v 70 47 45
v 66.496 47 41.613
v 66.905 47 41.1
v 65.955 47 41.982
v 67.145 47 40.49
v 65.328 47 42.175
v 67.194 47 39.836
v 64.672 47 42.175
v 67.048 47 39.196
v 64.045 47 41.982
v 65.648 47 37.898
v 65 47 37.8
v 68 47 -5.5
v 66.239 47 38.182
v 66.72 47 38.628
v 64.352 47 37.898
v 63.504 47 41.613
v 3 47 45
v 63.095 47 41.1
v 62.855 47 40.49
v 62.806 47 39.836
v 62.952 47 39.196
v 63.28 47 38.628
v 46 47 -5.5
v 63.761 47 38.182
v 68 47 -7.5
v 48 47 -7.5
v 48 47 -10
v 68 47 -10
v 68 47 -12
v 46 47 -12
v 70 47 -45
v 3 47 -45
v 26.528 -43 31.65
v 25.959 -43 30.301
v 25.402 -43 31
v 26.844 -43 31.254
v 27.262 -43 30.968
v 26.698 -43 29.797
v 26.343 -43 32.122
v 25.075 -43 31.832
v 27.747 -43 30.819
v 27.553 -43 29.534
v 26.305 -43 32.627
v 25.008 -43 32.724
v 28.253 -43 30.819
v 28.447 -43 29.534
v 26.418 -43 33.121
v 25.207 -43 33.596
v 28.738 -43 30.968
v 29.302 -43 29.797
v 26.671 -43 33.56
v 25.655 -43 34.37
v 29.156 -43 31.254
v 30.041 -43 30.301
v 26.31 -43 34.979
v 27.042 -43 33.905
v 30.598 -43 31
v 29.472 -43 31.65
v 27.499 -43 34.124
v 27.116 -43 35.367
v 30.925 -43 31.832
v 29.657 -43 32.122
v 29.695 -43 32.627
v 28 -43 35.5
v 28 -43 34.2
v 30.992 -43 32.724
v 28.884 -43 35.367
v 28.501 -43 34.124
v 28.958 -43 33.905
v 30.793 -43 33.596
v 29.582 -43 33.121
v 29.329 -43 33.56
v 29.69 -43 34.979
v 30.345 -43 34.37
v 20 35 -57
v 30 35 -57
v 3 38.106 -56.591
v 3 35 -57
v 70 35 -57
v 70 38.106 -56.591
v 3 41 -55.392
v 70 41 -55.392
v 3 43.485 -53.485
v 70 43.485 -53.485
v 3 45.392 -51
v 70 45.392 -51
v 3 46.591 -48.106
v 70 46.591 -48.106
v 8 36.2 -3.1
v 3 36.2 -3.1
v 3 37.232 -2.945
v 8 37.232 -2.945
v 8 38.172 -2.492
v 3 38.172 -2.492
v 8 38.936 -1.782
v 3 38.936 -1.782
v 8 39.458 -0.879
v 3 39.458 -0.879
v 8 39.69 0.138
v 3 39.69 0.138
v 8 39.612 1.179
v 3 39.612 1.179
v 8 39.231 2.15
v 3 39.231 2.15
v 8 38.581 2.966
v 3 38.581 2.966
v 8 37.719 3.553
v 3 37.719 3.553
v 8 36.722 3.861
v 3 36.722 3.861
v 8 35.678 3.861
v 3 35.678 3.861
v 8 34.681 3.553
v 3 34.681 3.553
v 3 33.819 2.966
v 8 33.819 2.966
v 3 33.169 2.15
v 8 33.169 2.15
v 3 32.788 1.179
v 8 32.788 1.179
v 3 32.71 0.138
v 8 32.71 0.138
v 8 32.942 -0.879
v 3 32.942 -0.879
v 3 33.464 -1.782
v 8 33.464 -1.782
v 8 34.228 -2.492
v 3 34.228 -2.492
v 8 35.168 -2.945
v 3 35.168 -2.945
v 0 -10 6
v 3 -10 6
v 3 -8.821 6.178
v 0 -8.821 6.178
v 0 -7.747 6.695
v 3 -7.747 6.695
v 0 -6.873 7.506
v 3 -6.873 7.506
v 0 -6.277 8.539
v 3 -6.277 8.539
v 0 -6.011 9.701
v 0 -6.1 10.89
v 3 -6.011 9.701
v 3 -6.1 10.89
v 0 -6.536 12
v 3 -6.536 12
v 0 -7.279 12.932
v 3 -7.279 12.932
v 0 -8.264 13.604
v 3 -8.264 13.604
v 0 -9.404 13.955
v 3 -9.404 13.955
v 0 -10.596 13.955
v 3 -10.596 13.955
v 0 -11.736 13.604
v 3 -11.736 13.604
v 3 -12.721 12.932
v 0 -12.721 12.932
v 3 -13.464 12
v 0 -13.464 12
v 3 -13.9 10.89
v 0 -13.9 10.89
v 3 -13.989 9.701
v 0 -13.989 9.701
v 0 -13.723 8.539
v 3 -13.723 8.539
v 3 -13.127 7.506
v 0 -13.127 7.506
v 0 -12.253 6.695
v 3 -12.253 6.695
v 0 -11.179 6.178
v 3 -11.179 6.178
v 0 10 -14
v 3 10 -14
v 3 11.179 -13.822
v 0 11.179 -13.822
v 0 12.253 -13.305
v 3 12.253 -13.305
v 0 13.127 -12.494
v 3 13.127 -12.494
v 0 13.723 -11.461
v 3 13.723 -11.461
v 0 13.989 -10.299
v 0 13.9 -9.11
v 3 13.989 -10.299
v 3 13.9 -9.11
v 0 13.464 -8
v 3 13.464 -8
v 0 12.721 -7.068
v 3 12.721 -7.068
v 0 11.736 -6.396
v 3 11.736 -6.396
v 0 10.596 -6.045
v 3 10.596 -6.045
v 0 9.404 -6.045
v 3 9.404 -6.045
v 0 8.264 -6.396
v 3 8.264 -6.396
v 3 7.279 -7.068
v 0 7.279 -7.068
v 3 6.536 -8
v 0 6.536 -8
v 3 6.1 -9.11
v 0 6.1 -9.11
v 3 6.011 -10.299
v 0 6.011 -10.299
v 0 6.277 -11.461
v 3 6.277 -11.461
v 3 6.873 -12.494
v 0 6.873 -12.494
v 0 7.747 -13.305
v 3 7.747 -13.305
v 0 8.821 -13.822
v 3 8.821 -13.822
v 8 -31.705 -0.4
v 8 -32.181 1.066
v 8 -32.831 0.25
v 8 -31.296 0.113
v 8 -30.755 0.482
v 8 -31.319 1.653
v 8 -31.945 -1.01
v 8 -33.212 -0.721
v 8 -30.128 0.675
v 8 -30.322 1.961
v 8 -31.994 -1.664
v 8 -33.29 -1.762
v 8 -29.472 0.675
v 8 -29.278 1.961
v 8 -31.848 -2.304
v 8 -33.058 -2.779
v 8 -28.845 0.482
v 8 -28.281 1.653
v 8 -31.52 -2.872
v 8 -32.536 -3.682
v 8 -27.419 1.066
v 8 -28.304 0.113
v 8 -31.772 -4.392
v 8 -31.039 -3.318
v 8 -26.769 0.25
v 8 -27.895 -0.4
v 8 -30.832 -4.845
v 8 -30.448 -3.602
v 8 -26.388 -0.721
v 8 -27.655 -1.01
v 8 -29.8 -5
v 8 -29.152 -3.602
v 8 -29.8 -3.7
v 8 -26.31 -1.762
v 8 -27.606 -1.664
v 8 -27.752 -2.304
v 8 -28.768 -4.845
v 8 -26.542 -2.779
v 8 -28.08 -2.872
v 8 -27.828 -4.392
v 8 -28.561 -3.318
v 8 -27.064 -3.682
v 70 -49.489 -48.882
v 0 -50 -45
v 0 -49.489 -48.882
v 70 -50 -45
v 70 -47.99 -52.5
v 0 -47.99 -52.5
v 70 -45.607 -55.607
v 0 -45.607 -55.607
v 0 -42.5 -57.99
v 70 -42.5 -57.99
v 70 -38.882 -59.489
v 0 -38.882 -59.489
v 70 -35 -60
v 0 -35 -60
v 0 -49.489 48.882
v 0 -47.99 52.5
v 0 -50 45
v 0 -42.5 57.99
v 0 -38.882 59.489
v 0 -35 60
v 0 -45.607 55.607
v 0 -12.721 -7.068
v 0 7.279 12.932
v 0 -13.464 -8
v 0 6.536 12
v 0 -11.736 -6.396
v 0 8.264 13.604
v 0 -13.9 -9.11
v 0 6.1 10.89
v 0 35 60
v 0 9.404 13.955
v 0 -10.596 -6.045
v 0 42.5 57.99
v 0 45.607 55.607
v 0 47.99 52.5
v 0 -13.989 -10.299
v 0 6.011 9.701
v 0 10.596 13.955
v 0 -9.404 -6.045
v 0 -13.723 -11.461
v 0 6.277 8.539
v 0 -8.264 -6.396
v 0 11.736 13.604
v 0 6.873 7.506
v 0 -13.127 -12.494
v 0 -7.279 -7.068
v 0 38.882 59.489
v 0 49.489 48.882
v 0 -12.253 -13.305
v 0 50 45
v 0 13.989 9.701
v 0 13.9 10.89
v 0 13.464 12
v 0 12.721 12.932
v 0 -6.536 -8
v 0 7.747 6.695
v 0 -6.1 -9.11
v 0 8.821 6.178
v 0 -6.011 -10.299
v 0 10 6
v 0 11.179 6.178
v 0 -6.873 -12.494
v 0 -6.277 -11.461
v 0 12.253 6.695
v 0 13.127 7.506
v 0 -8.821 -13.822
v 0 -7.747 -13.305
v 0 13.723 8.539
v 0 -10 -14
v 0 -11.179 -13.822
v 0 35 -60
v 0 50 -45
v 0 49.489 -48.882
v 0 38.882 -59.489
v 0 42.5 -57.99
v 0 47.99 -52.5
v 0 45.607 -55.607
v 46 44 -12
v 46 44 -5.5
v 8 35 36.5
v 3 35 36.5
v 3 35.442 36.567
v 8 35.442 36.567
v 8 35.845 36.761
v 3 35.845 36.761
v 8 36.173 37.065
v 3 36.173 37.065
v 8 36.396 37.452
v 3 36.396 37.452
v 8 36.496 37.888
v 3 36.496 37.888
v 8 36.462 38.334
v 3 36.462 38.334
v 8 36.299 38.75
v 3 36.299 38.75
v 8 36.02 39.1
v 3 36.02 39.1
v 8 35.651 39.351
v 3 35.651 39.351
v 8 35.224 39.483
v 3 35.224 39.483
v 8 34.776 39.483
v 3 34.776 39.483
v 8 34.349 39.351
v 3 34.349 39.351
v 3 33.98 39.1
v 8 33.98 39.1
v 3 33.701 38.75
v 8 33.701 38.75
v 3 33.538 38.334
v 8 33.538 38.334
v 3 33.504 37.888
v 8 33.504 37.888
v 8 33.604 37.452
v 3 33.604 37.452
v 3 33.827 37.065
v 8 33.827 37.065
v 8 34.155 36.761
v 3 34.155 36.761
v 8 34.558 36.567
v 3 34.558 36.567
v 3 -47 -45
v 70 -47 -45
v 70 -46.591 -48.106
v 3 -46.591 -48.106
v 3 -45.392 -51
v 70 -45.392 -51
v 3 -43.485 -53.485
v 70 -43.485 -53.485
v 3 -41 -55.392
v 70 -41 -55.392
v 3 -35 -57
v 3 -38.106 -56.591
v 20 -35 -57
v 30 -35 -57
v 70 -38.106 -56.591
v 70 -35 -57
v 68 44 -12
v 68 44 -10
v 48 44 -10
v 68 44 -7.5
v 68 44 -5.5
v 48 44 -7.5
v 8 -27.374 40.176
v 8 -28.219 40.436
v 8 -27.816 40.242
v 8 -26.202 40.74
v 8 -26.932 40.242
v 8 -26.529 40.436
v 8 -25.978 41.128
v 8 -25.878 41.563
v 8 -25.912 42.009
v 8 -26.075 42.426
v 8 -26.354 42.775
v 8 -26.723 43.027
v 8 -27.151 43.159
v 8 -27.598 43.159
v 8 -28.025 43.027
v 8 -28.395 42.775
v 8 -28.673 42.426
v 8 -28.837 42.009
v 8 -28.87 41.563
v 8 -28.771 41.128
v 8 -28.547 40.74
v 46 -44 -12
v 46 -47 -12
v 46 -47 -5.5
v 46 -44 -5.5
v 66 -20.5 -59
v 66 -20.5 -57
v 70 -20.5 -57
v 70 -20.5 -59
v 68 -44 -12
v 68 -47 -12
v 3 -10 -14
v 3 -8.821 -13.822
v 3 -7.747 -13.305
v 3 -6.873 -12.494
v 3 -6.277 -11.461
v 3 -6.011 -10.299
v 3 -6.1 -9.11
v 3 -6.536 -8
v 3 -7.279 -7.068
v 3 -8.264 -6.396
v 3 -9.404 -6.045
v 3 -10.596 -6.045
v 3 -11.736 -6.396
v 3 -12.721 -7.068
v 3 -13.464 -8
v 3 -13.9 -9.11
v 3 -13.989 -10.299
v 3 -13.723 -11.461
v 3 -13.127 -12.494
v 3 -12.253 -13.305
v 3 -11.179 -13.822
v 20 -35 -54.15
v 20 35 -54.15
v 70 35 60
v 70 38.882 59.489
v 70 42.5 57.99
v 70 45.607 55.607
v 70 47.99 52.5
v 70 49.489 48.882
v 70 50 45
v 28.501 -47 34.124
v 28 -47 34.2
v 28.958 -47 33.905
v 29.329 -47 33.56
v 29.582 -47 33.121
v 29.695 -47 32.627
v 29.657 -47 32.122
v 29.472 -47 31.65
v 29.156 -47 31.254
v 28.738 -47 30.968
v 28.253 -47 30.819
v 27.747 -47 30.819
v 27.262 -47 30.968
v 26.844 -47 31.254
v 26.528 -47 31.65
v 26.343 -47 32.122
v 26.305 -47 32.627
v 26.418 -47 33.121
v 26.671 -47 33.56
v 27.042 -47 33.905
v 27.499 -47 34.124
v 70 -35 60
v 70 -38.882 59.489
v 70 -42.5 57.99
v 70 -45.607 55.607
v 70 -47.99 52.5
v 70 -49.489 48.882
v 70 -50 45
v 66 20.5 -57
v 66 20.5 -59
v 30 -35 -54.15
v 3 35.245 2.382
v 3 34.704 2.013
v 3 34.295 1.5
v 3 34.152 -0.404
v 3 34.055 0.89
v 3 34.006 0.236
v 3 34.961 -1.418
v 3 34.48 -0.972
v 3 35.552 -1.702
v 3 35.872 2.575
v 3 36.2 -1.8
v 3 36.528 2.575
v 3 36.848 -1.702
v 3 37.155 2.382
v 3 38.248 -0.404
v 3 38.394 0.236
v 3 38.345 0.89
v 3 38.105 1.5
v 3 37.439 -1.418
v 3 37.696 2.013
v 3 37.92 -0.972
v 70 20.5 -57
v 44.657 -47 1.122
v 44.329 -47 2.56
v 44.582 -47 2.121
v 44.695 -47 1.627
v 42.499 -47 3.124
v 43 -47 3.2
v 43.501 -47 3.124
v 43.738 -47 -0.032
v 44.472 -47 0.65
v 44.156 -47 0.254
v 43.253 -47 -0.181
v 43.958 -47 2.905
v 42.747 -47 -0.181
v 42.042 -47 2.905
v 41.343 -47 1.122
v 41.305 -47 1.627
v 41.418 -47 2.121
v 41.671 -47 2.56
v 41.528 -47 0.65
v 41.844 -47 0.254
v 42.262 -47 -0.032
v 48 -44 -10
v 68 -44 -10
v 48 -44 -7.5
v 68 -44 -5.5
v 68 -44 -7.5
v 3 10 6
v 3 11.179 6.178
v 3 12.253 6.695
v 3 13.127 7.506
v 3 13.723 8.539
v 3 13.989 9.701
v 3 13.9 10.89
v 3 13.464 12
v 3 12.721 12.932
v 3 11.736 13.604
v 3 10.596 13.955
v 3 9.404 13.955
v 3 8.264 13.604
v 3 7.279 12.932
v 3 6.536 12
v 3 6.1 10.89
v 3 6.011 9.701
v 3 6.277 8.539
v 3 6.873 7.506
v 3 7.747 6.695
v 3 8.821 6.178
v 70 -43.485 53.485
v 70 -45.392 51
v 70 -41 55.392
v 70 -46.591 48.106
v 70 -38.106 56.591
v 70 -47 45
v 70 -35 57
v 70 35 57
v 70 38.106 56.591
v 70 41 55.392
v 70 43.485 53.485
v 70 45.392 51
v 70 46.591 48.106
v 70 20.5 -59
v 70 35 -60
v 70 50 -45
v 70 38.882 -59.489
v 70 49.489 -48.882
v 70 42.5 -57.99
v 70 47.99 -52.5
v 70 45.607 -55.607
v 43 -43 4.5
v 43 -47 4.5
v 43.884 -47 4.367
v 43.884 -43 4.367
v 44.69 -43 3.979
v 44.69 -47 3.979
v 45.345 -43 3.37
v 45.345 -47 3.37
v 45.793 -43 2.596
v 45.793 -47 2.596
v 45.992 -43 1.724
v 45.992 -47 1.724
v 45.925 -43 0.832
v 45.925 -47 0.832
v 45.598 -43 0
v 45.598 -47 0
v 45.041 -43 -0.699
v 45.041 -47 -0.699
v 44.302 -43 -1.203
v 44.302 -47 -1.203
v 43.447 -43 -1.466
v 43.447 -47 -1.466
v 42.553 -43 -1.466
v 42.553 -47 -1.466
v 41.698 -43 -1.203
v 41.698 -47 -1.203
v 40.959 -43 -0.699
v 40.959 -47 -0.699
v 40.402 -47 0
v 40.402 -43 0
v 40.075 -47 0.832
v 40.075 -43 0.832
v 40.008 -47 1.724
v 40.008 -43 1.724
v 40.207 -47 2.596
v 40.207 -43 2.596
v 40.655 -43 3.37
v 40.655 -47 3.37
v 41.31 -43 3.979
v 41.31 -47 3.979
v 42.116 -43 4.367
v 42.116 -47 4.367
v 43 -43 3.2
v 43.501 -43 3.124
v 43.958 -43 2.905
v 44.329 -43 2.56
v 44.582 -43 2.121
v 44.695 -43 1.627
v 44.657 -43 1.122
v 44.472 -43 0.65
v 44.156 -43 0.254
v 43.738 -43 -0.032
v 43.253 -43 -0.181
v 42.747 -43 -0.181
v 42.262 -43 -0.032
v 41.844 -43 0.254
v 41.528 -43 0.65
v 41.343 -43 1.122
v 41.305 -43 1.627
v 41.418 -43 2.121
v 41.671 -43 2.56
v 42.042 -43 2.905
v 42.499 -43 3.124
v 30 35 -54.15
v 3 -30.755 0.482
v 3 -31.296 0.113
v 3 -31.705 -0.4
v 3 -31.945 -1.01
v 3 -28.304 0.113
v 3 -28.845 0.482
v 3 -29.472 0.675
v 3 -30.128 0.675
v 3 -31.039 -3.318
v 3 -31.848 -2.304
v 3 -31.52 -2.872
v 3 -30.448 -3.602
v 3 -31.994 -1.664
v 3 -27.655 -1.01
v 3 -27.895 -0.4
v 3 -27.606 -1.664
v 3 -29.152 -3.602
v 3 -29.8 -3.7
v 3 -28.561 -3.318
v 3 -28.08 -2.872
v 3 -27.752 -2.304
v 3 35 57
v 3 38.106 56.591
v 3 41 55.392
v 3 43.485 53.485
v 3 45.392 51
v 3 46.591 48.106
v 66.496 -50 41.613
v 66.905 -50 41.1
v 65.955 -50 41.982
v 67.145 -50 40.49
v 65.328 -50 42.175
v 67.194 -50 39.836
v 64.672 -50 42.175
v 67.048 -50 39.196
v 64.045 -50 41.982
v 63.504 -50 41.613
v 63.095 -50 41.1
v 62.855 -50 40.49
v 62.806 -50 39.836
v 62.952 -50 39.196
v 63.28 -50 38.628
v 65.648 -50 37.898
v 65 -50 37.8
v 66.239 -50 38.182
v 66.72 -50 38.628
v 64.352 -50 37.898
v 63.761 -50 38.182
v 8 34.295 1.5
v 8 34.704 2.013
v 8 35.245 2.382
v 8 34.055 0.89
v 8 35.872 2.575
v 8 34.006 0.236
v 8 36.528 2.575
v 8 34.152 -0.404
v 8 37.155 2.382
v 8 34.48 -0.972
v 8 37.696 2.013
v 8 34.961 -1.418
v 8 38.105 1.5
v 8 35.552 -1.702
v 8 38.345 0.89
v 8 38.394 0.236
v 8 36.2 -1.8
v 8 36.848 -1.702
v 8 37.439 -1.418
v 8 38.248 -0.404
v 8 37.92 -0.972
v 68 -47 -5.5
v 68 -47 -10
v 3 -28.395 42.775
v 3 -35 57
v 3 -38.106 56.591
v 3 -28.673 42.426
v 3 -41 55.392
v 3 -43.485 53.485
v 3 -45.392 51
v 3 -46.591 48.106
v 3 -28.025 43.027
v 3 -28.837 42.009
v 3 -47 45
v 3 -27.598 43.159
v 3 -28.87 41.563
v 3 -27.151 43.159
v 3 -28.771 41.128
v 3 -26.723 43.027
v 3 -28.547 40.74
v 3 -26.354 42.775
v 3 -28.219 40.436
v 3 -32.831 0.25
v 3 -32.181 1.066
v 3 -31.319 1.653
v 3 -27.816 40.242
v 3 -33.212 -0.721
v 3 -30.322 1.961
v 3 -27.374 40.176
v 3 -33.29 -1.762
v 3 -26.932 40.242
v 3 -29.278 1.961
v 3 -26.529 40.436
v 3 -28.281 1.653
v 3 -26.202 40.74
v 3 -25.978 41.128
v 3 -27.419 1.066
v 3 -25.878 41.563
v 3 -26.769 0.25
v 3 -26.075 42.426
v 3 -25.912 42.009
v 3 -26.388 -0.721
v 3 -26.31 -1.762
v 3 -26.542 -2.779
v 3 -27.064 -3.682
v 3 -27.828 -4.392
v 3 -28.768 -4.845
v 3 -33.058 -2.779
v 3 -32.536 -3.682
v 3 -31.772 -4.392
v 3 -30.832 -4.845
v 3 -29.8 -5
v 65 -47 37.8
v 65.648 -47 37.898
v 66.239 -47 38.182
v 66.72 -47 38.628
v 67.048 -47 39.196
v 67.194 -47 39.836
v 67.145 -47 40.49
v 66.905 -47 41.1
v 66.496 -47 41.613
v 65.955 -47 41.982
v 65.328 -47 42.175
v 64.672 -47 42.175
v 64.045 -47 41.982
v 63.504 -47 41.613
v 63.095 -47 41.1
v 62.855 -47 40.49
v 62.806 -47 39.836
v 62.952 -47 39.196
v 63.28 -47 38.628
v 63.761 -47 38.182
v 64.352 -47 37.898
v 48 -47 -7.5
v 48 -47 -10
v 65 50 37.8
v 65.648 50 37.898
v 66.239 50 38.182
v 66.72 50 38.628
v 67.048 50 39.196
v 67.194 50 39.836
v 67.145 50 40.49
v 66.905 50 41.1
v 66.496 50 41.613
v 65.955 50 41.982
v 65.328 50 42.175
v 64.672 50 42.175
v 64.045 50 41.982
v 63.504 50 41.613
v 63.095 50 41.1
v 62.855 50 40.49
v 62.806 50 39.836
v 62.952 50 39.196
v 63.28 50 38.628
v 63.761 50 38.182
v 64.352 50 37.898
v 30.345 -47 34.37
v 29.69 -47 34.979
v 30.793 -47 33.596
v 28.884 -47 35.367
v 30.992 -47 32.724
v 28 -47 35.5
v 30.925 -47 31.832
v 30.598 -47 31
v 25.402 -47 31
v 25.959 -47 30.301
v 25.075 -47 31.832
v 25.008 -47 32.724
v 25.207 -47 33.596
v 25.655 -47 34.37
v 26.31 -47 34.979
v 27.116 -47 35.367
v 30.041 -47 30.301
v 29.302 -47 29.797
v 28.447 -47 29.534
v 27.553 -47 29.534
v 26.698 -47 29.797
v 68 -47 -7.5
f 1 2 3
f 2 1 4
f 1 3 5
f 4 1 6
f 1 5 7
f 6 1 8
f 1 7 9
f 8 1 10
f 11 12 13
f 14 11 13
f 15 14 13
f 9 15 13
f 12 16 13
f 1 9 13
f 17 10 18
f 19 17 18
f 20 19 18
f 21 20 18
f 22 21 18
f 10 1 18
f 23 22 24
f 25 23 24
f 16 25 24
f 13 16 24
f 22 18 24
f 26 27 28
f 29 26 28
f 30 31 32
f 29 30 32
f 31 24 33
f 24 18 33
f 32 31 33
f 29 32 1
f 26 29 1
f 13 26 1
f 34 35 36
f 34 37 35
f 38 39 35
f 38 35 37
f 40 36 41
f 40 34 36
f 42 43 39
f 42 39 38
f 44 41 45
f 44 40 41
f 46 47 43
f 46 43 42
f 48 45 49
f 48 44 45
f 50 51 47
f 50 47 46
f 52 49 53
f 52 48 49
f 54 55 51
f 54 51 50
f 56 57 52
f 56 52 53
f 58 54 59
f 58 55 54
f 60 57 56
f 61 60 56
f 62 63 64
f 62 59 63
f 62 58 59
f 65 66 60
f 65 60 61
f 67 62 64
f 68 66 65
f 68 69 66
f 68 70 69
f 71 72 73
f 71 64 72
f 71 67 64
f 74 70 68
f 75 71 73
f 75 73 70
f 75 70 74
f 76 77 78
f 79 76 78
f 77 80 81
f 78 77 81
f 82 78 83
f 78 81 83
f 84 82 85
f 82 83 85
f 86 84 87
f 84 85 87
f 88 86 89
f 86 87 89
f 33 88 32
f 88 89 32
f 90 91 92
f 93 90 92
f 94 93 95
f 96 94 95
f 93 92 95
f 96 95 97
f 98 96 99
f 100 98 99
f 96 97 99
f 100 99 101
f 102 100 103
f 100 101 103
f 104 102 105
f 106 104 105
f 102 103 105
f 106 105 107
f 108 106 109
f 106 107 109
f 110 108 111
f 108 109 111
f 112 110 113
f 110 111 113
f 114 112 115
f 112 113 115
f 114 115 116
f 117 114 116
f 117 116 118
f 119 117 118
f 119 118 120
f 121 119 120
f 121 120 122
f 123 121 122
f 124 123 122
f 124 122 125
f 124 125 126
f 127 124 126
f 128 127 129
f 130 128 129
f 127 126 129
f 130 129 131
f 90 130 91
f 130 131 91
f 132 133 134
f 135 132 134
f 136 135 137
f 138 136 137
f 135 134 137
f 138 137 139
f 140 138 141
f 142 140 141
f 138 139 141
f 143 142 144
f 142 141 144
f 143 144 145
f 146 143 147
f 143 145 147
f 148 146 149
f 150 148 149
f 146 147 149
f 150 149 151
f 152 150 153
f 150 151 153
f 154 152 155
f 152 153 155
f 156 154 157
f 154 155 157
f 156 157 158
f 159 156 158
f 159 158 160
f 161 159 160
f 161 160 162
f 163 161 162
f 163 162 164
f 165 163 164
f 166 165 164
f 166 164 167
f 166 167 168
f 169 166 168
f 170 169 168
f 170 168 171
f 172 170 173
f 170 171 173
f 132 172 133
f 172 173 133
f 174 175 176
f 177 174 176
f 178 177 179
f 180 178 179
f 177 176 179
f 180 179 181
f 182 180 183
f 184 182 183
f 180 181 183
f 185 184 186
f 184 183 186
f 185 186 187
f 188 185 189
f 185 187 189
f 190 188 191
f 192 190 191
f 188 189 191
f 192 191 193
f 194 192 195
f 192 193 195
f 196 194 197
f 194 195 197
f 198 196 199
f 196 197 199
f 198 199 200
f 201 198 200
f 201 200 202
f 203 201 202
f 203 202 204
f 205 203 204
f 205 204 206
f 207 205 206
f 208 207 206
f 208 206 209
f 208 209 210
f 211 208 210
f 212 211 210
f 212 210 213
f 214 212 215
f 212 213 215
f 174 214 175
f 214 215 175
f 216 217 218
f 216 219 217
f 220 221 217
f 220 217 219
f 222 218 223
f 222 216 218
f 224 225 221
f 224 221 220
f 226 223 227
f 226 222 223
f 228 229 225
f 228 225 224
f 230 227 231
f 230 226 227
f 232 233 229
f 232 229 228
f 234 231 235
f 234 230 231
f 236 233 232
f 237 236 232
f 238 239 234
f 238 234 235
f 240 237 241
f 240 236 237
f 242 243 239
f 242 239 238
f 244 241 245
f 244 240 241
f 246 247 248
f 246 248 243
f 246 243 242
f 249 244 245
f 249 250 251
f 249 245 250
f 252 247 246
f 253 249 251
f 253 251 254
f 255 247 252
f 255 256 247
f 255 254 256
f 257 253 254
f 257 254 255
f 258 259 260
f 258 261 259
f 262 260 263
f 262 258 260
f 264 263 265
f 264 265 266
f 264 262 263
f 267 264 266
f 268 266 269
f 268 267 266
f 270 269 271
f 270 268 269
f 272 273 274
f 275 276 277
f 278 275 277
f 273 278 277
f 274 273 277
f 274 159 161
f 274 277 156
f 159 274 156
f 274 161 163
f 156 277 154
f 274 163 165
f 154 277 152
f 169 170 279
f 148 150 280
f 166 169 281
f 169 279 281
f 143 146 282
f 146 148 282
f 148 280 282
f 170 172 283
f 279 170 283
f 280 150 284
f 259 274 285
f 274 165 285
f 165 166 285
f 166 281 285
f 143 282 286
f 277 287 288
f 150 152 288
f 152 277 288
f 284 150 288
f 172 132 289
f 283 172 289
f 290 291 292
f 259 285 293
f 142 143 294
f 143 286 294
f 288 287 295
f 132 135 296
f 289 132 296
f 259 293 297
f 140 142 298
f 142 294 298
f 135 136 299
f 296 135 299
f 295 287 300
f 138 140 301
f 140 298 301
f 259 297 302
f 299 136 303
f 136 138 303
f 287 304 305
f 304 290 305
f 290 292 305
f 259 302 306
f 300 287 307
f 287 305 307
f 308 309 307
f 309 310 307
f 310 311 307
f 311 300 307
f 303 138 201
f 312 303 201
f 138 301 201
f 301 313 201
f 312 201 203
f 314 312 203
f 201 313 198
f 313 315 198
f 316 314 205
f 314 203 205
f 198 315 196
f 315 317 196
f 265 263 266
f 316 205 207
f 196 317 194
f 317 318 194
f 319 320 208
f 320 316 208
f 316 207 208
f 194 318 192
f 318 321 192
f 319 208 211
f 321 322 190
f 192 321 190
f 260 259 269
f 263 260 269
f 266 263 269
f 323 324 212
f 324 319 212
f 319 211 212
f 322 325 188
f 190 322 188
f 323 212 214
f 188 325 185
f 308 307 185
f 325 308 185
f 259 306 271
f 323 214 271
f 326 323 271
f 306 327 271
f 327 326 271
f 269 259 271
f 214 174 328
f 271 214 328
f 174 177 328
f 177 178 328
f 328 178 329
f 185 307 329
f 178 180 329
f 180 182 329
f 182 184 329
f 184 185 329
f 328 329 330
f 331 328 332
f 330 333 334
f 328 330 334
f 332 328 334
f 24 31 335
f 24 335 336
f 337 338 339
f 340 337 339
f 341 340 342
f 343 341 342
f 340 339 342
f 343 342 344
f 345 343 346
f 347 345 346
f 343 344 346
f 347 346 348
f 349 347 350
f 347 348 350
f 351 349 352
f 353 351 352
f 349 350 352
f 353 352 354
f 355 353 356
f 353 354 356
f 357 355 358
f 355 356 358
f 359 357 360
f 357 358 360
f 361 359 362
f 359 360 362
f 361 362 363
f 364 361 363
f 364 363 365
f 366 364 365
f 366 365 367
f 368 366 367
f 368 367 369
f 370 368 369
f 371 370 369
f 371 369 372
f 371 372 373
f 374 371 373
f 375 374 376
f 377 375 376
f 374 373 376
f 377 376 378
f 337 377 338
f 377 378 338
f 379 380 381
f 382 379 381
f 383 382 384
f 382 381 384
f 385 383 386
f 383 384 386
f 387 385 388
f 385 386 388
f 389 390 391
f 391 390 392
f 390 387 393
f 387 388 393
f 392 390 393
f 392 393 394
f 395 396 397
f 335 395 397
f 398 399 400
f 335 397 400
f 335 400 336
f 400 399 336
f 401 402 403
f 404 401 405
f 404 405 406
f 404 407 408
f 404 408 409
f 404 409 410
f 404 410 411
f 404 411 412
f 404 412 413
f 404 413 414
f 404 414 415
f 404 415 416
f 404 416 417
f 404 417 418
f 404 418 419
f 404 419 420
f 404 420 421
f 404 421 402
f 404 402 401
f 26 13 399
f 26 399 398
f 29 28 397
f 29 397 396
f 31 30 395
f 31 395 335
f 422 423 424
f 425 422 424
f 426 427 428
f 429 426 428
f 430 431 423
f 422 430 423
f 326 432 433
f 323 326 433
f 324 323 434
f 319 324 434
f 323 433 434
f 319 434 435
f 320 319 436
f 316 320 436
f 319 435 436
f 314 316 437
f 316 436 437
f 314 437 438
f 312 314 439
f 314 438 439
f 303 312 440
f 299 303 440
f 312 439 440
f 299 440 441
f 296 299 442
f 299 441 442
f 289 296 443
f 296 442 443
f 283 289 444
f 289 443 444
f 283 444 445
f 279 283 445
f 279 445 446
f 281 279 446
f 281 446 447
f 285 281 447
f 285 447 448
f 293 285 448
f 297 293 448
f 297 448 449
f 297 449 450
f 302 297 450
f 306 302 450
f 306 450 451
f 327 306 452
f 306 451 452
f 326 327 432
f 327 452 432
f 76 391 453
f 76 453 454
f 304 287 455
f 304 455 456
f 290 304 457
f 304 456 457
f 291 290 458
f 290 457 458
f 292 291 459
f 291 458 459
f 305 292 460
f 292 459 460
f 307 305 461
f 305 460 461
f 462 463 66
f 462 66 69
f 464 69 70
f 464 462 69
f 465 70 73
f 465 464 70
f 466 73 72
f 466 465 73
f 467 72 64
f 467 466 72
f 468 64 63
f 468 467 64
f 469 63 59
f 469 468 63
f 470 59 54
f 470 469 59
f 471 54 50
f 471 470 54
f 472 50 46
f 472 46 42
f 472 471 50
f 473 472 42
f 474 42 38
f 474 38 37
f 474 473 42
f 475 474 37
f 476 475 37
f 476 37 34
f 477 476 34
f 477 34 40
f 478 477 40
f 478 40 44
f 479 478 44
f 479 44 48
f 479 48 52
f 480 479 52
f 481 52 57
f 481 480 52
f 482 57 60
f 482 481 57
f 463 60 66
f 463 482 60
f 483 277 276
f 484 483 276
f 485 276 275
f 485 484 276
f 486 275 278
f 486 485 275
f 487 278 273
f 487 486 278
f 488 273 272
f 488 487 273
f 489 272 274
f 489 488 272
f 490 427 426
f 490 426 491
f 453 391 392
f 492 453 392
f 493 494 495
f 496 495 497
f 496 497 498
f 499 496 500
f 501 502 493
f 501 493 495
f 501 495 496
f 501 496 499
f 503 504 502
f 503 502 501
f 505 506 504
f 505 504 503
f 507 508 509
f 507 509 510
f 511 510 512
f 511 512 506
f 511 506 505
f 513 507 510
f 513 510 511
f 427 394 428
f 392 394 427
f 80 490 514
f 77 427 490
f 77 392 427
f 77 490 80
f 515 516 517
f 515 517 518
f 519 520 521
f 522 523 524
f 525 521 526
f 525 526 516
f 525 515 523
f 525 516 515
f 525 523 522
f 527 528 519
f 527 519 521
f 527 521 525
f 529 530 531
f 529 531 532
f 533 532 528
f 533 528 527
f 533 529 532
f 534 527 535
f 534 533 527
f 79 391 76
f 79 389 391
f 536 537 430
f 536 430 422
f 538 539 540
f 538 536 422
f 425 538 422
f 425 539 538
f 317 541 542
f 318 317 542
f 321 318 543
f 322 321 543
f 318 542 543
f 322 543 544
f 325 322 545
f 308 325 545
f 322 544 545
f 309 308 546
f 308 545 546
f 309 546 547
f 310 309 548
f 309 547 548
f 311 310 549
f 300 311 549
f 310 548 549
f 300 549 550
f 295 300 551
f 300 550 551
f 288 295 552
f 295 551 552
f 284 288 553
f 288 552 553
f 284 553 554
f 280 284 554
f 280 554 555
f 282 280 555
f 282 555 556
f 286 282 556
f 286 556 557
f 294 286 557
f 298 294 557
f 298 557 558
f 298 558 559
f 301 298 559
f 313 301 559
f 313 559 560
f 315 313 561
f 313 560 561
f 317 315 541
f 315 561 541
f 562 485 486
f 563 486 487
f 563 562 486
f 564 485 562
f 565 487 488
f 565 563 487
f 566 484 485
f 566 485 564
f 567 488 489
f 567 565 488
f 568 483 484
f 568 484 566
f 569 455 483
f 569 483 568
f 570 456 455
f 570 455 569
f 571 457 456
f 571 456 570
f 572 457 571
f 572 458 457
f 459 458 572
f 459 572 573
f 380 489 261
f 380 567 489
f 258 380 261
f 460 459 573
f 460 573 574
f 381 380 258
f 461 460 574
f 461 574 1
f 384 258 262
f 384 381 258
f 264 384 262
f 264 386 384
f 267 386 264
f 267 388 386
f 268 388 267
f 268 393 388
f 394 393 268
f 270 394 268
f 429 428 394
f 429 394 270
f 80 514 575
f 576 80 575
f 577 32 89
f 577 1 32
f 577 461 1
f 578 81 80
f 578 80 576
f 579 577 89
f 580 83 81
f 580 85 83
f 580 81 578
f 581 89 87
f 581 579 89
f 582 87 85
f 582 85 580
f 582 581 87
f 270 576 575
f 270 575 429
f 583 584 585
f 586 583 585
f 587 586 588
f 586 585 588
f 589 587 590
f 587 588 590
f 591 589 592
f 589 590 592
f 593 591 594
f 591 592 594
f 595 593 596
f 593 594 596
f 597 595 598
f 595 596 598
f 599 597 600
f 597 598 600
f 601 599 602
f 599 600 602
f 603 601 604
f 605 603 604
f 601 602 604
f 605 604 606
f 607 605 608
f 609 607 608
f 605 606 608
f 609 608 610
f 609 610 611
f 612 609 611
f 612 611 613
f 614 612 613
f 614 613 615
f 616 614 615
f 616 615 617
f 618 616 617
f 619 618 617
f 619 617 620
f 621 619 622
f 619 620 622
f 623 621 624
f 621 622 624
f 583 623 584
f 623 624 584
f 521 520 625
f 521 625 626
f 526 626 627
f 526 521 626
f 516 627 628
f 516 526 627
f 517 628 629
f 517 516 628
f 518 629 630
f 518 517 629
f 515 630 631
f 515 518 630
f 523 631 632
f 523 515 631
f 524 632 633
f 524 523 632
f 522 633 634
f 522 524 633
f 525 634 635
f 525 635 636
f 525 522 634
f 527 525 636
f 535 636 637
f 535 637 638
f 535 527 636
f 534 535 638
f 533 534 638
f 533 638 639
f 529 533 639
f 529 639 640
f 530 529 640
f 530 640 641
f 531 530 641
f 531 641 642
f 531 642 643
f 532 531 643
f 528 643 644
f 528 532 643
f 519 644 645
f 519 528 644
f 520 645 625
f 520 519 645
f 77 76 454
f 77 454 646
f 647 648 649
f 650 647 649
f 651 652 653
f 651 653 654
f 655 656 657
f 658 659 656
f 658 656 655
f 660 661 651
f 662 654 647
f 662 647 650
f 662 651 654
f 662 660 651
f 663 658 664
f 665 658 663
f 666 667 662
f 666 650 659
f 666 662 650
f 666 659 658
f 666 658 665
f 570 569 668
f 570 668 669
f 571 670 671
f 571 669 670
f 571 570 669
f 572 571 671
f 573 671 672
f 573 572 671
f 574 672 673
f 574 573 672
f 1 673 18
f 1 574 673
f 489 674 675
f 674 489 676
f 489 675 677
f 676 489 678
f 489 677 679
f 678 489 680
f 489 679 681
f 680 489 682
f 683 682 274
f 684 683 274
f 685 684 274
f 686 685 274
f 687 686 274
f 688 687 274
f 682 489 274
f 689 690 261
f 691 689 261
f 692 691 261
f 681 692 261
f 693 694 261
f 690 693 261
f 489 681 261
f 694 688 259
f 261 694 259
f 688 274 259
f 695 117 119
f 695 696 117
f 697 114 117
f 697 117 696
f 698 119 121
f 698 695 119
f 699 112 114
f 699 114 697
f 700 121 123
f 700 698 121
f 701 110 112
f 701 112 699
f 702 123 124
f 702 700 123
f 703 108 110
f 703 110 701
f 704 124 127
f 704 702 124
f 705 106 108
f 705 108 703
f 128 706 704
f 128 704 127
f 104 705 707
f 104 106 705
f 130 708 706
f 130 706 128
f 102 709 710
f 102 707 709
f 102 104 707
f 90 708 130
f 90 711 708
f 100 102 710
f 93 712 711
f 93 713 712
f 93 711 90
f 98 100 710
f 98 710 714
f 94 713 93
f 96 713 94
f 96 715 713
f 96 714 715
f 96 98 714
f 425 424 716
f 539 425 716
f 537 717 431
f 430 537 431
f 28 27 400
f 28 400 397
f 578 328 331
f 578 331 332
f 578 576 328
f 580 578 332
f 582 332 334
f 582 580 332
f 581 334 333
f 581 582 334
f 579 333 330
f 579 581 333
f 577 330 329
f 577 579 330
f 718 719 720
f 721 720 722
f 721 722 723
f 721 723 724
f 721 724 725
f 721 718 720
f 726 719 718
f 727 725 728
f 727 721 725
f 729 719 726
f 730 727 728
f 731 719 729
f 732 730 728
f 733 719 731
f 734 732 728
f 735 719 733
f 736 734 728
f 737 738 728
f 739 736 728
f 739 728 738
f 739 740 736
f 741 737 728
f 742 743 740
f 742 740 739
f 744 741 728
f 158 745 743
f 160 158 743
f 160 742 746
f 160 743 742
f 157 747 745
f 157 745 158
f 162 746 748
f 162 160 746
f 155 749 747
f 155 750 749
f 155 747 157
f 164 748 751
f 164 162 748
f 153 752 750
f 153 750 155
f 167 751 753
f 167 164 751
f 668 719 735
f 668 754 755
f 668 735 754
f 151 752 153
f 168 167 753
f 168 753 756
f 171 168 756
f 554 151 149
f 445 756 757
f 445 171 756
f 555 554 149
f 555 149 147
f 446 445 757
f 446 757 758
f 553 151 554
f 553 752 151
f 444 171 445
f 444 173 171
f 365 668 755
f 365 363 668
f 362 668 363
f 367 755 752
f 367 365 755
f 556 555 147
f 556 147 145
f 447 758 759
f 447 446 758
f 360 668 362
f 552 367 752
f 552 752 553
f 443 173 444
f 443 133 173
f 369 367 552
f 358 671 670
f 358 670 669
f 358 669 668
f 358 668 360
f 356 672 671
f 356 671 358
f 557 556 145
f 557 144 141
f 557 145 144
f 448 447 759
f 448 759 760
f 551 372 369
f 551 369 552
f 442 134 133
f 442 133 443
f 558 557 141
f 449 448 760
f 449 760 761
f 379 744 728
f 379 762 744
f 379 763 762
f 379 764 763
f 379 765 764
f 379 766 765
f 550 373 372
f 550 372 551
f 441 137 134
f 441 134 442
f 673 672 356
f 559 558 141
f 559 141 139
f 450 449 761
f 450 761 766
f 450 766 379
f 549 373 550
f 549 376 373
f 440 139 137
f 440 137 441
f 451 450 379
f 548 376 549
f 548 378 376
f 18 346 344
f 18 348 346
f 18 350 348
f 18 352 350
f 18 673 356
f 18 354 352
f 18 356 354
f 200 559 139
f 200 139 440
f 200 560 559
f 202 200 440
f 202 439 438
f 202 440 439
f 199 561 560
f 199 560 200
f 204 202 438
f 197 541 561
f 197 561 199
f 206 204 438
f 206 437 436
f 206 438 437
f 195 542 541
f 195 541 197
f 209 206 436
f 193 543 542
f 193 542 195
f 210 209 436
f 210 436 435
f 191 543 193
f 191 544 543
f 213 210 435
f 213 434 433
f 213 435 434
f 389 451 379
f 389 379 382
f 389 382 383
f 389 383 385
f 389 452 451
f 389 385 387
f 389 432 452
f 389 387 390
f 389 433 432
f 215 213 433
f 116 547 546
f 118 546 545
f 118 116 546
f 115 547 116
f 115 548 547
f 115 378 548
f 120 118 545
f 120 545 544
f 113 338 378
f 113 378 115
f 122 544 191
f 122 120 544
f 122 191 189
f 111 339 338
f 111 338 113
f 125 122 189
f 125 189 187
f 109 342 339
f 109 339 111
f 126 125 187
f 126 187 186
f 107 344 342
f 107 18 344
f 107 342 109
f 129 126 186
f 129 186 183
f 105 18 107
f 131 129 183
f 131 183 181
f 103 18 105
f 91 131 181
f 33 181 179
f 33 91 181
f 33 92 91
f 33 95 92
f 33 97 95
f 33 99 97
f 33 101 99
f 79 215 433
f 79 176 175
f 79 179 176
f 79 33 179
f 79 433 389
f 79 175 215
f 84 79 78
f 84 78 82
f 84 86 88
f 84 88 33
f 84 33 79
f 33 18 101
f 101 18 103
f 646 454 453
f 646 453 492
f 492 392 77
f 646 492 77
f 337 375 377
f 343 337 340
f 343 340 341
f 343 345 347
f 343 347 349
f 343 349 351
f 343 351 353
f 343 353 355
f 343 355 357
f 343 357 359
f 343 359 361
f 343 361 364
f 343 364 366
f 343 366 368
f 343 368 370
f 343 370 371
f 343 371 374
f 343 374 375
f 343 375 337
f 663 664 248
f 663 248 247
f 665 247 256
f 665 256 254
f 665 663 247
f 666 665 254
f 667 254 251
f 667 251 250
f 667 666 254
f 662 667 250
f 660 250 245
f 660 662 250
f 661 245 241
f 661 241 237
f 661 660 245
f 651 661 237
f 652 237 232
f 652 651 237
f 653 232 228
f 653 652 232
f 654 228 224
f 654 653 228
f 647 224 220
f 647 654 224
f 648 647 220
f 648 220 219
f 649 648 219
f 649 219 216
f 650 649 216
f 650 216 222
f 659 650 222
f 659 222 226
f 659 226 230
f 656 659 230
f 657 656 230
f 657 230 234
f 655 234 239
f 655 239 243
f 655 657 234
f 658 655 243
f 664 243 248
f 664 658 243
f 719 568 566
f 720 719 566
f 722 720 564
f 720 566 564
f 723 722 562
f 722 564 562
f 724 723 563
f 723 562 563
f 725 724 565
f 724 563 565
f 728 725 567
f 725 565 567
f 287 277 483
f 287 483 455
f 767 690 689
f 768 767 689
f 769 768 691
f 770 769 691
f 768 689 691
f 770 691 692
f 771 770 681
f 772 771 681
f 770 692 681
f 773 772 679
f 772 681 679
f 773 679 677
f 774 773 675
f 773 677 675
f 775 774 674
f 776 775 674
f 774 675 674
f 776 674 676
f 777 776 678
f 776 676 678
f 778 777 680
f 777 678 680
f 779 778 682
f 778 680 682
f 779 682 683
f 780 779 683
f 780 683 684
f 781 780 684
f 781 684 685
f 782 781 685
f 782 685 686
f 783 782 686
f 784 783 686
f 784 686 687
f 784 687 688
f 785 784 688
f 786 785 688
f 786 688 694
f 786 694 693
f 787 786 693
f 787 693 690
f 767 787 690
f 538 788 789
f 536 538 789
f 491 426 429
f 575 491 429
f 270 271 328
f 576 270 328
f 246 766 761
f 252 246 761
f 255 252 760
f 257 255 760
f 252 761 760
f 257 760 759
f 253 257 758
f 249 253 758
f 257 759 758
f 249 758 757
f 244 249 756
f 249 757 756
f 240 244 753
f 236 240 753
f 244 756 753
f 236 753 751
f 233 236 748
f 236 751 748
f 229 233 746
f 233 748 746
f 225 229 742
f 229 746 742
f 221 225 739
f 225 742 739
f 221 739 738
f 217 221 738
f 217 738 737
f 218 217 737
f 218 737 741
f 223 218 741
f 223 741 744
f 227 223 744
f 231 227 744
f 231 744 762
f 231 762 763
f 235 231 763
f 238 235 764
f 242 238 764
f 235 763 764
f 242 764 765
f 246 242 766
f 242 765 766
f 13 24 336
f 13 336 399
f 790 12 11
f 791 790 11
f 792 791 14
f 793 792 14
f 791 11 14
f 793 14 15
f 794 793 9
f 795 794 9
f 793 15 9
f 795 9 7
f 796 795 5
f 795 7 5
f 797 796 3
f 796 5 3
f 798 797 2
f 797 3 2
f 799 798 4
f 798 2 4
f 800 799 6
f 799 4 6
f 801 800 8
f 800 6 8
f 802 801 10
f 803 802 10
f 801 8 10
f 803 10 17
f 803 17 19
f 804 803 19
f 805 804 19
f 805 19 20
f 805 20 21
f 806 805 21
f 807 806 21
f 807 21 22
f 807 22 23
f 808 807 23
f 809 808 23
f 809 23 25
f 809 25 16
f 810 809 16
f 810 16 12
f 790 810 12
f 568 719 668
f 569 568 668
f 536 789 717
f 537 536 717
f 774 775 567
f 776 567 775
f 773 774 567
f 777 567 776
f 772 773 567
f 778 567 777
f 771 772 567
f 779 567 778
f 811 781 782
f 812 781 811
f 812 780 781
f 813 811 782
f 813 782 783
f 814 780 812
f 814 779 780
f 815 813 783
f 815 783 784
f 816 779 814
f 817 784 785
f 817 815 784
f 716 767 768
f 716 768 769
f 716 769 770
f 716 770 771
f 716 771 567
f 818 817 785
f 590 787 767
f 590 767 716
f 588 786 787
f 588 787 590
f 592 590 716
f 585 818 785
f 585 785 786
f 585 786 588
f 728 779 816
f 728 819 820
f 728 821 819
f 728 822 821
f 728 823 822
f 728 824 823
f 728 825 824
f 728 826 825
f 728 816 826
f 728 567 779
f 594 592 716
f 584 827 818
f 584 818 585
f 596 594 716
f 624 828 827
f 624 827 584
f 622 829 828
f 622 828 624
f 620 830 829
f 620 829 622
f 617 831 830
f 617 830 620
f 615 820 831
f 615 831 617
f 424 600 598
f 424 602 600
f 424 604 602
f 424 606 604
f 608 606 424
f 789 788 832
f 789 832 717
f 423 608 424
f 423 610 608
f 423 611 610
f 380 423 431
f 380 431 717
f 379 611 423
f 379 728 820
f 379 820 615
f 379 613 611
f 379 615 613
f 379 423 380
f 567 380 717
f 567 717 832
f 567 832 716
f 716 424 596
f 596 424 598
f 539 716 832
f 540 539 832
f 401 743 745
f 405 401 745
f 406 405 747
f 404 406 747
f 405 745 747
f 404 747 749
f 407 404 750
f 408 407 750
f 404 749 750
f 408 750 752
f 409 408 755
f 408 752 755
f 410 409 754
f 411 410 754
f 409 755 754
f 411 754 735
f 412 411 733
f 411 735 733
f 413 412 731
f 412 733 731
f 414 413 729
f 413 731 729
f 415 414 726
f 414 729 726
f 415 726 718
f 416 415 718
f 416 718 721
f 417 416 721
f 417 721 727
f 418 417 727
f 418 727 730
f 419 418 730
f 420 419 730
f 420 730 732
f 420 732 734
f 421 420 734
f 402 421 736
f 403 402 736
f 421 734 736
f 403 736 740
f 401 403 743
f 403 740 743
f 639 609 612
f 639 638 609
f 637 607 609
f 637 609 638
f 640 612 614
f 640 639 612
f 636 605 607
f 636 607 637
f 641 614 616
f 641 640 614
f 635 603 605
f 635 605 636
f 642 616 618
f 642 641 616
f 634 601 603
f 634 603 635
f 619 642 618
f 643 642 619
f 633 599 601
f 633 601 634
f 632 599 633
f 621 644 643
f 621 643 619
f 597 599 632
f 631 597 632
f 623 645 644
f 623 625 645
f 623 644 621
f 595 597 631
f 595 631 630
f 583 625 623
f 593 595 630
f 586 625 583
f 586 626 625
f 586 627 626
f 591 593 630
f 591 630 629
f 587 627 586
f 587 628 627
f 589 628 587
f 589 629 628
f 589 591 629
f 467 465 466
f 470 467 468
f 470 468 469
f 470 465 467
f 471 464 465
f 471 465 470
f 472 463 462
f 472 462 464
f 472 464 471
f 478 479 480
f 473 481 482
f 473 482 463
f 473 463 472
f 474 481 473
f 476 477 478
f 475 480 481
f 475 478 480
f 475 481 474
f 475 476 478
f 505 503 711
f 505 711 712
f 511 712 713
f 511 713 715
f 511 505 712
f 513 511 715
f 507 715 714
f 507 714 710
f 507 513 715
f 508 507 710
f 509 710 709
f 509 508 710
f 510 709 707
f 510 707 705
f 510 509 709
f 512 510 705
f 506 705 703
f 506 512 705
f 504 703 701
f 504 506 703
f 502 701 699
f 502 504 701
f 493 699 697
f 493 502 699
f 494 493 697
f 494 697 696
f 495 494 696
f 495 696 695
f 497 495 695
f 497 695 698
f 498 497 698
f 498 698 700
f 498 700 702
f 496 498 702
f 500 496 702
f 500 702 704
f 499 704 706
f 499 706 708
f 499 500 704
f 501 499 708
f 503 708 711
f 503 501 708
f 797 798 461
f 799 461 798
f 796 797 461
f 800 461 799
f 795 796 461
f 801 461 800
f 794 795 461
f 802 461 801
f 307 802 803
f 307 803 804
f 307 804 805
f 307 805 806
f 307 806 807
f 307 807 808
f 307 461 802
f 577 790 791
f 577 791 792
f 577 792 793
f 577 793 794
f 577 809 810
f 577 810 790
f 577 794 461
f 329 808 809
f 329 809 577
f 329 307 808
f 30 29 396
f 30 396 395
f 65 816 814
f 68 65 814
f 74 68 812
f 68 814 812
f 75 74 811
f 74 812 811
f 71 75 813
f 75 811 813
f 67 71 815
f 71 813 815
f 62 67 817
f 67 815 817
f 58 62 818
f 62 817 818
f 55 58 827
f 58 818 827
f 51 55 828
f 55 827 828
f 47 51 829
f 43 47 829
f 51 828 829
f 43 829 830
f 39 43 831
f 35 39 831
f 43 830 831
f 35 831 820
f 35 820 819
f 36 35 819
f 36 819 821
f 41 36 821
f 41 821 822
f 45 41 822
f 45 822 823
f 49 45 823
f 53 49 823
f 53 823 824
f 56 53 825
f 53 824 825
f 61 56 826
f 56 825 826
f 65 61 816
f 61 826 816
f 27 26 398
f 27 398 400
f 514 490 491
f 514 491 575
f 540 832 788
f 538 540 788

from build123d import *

# Parameters (mm, degrees)
SKETCH1_W            = 120
SKETCH1_H            = 100
BOSS_EXTRUDE2_DEPTH  = 70
FILLET1_R            = 15
SHELL2_T             = -3
SKETCH3_W            = 4
SKETCH3_H            = 41
CUT_EXTRUDE1_DEPTH   = 2
SKETCH4_W            = 10
SKETCH4_H            = 70
BOSS_EXTRUDE3_DEPTH  = 2.85
SKETCH16_R           = 3.5
SKETCH16_R_2         = 2.2
SKETCH16_R_3         = 1.5
BOSS_EXTRUDE5_DEPTH  = 5
BOSS_EXTRUDE6_DEPTH  = 3
SKETCH23_R           = 3
SKETCH23_R_2         = 1.7
BOSS_EXTRUDE10_DEPTH = 4
SKETCH6_R            = 2.2
CUT_EXTRUDE2_DEPTH   = 137.014705087
SKETCH24_R           = 4
CUT_EXTRUDE3_DEPTH   = 3


with BuildPart() as part:
    # Sketch1 → Boss-Extrude2 (new body)
    with BuildSketch(Plane(origin=(0, 0, 0), x_dir=(0, 0, -1), z_dir=(1, 0, 0))):
        Rectangle(SKETCH1_W, SKETCH1_H)
    extrude(amount=BOSS_EXTRUDE2_DEPTH)

    # Fillet1
    fillet1_edges = [part.edges().sort_by_distance(p)[0] for p in [
        (35, -50, -60),
        (35, -50, 60),
        (35, 50, 60),
        (35, 50, -60),
    ]]
    fillet(fillet1_edges, radius=FILLET1_R)

    # Shell2
    shell2_openings = [part.faces().sort_by_distance(p)[0] for p in [
        (70, 0, 0),
    ]]
    offset(amount=SHELL2_T, openings=shell2_openings, kind=Kind.INTERSECTION)

    # Sketch3 → Cut-Extrude1 (cut)
    with BuildSketch(Plane.XY.offset(-57)):
        with Locations((68, 0)):
            Rectangle(SKETCH3_W, SKETCH3_H)
    extrude(amount=-CUT_EXTRUDE1_DEPTH, mode=Mode.SUBTRACT)

    # Sketch4 → Boss-Extrude3 (add)
    with BuildSketch(Plane.XY.offset(-57)):
        with Locations((25, 0)):
            Rectangle(SKETCH4_W, SKETCH4_H)
    extrude(amount=BOSS_EXTRUDE3_DEPTH)

    # Sketch16 → Boss-Extrude5 (add)
    # profile 1 of 4: a face of its own
    with BuildSketch(Plane(origin=(3, 0, 0), x_dir=(0, 0, -1), z_dir=(1, 0, 0))):
        with Locations((1.5, -29.8)):
            Circle(SKETCH16_R)
        with Locations((1.5, -29.8)):
            Circle(SKETCH16_R_2, mode=Mode.SUBTRACT)
    # profile 2 of 4: a face of its own
    with BuildSketch(Plane(origin=(3, 0, 0), x_dir=(0, 0, -1), z_dir=(1, 0, 0))):
        with Locations((-0.4, 36.2)):
            Circle(SKETCH16_R)
        with Locations((-0.4, 36.2)):
            Circle(SKETCH16_R_2, mode=Mode.SUBTRACT)
    # profile 3 of 4: a face of its own
    with BuildSketch(Plane(origin=(3, 0, 0), x_dir=(0, 0, -1), z_dir=(1, 0, 0))):
        with Locations((-38, 35)):
            Circle(SKETCH16_R_3)
    # profile 4 of 4: a face of its own
    with BuildSketch(Plane(origin=(3, 0, 0), x_dir=(0, 0, -1), z_dir=(1, 0, 0))):
        with Locations((-41.675568993, -27.374268476)):
            Circle(SKETCH16_R_3)
    extrude(amount=BOSS_EXTRUDE5_DEPTH)

    # Sketch15 → Boss-Extrude6 (add)
    with BuildSketch(Plane.XZ.offset(-47)):
        Polygon((46, -5.5), (68, -5.5), (68, -7.5), (48, -7.5), (48, -10), (68, -10), (68, -12), (46, -12), align=None)
    boss_extrude6 = extrude(amount=BOSS_EXTRUDE6_DEPTH)

    # Mirror1: Boss-Extrude6 across plane
    add(boss_extrude6.mirror(Plane.ZX))

    # Sketch23 → Boss-Extrude10 (add)
    # profile 1 of 2: a face of its own
    with BuildSketch(Plane(origin=(0, -47, 0), x_dir=(1, 0, 0), z_dir=(0, 1, 0))):
        with Locations(Location((43, -1.5, 0), (0, 0, 270))):
            Circle(SKETCH23_R)
        with Locations(Location((43, -1.5, 0), (0, 0, 270))):
            Circle(SKETCH23_R_2, mode=Mode.SUBTRACT)
    # profile 2 of 2: a face of its own
    with BuildSketch(Plane(origin=(0, -47, 0), x_dir=(1, 0, 0), z_dir=(0, 1, 0))):
        with Locations(Location((28, -32.5, 0), (0, 0, 270))):
            Circle(SKETCH23_R)
        with Locations(Location((28, -32.5, 0), (0, 0, 270))):
            Circle(SKETCH23_R_2, mode=Mode.SUBTRACT)
    extrude(amount=BOSS_EXTRUDE10_DEPTH)

    # Sketch6 → Cut-Extrude2 (cut, through all)
    with BuildSketch(Plane.XZ.offset(50)):
        with Locations(Location((65, 40, 0), (0, 0, 270))):
            Circle(SKETCH6_R)
    extrude(amount=-CUT_EXTRUDE2_DEPTH, mode=Mode.SUBTRACT)

    # Sketch24 → Cut-Extrude3 (cut)
    with BuildSketch(Plane(origin=(3, 0, 0), x_dir=(0, 0, -1), z_dir=(1, 0, 0))):
        with Locations((-10, 10)):
            Circle(SKETCH24_R)
        with Locations((10, 10)):
            Circle(SKETCH24_R)
        with Locations((-10, -10)):
            Circle(SKETCH24_R)
        with Locations((10, -10)):
            Circle(SKETCH24_R)
    extrude(amount=-CUT_EXTRUDE3_DEPTH, mode=Mode.SUBTRACT)


solid = part.part
